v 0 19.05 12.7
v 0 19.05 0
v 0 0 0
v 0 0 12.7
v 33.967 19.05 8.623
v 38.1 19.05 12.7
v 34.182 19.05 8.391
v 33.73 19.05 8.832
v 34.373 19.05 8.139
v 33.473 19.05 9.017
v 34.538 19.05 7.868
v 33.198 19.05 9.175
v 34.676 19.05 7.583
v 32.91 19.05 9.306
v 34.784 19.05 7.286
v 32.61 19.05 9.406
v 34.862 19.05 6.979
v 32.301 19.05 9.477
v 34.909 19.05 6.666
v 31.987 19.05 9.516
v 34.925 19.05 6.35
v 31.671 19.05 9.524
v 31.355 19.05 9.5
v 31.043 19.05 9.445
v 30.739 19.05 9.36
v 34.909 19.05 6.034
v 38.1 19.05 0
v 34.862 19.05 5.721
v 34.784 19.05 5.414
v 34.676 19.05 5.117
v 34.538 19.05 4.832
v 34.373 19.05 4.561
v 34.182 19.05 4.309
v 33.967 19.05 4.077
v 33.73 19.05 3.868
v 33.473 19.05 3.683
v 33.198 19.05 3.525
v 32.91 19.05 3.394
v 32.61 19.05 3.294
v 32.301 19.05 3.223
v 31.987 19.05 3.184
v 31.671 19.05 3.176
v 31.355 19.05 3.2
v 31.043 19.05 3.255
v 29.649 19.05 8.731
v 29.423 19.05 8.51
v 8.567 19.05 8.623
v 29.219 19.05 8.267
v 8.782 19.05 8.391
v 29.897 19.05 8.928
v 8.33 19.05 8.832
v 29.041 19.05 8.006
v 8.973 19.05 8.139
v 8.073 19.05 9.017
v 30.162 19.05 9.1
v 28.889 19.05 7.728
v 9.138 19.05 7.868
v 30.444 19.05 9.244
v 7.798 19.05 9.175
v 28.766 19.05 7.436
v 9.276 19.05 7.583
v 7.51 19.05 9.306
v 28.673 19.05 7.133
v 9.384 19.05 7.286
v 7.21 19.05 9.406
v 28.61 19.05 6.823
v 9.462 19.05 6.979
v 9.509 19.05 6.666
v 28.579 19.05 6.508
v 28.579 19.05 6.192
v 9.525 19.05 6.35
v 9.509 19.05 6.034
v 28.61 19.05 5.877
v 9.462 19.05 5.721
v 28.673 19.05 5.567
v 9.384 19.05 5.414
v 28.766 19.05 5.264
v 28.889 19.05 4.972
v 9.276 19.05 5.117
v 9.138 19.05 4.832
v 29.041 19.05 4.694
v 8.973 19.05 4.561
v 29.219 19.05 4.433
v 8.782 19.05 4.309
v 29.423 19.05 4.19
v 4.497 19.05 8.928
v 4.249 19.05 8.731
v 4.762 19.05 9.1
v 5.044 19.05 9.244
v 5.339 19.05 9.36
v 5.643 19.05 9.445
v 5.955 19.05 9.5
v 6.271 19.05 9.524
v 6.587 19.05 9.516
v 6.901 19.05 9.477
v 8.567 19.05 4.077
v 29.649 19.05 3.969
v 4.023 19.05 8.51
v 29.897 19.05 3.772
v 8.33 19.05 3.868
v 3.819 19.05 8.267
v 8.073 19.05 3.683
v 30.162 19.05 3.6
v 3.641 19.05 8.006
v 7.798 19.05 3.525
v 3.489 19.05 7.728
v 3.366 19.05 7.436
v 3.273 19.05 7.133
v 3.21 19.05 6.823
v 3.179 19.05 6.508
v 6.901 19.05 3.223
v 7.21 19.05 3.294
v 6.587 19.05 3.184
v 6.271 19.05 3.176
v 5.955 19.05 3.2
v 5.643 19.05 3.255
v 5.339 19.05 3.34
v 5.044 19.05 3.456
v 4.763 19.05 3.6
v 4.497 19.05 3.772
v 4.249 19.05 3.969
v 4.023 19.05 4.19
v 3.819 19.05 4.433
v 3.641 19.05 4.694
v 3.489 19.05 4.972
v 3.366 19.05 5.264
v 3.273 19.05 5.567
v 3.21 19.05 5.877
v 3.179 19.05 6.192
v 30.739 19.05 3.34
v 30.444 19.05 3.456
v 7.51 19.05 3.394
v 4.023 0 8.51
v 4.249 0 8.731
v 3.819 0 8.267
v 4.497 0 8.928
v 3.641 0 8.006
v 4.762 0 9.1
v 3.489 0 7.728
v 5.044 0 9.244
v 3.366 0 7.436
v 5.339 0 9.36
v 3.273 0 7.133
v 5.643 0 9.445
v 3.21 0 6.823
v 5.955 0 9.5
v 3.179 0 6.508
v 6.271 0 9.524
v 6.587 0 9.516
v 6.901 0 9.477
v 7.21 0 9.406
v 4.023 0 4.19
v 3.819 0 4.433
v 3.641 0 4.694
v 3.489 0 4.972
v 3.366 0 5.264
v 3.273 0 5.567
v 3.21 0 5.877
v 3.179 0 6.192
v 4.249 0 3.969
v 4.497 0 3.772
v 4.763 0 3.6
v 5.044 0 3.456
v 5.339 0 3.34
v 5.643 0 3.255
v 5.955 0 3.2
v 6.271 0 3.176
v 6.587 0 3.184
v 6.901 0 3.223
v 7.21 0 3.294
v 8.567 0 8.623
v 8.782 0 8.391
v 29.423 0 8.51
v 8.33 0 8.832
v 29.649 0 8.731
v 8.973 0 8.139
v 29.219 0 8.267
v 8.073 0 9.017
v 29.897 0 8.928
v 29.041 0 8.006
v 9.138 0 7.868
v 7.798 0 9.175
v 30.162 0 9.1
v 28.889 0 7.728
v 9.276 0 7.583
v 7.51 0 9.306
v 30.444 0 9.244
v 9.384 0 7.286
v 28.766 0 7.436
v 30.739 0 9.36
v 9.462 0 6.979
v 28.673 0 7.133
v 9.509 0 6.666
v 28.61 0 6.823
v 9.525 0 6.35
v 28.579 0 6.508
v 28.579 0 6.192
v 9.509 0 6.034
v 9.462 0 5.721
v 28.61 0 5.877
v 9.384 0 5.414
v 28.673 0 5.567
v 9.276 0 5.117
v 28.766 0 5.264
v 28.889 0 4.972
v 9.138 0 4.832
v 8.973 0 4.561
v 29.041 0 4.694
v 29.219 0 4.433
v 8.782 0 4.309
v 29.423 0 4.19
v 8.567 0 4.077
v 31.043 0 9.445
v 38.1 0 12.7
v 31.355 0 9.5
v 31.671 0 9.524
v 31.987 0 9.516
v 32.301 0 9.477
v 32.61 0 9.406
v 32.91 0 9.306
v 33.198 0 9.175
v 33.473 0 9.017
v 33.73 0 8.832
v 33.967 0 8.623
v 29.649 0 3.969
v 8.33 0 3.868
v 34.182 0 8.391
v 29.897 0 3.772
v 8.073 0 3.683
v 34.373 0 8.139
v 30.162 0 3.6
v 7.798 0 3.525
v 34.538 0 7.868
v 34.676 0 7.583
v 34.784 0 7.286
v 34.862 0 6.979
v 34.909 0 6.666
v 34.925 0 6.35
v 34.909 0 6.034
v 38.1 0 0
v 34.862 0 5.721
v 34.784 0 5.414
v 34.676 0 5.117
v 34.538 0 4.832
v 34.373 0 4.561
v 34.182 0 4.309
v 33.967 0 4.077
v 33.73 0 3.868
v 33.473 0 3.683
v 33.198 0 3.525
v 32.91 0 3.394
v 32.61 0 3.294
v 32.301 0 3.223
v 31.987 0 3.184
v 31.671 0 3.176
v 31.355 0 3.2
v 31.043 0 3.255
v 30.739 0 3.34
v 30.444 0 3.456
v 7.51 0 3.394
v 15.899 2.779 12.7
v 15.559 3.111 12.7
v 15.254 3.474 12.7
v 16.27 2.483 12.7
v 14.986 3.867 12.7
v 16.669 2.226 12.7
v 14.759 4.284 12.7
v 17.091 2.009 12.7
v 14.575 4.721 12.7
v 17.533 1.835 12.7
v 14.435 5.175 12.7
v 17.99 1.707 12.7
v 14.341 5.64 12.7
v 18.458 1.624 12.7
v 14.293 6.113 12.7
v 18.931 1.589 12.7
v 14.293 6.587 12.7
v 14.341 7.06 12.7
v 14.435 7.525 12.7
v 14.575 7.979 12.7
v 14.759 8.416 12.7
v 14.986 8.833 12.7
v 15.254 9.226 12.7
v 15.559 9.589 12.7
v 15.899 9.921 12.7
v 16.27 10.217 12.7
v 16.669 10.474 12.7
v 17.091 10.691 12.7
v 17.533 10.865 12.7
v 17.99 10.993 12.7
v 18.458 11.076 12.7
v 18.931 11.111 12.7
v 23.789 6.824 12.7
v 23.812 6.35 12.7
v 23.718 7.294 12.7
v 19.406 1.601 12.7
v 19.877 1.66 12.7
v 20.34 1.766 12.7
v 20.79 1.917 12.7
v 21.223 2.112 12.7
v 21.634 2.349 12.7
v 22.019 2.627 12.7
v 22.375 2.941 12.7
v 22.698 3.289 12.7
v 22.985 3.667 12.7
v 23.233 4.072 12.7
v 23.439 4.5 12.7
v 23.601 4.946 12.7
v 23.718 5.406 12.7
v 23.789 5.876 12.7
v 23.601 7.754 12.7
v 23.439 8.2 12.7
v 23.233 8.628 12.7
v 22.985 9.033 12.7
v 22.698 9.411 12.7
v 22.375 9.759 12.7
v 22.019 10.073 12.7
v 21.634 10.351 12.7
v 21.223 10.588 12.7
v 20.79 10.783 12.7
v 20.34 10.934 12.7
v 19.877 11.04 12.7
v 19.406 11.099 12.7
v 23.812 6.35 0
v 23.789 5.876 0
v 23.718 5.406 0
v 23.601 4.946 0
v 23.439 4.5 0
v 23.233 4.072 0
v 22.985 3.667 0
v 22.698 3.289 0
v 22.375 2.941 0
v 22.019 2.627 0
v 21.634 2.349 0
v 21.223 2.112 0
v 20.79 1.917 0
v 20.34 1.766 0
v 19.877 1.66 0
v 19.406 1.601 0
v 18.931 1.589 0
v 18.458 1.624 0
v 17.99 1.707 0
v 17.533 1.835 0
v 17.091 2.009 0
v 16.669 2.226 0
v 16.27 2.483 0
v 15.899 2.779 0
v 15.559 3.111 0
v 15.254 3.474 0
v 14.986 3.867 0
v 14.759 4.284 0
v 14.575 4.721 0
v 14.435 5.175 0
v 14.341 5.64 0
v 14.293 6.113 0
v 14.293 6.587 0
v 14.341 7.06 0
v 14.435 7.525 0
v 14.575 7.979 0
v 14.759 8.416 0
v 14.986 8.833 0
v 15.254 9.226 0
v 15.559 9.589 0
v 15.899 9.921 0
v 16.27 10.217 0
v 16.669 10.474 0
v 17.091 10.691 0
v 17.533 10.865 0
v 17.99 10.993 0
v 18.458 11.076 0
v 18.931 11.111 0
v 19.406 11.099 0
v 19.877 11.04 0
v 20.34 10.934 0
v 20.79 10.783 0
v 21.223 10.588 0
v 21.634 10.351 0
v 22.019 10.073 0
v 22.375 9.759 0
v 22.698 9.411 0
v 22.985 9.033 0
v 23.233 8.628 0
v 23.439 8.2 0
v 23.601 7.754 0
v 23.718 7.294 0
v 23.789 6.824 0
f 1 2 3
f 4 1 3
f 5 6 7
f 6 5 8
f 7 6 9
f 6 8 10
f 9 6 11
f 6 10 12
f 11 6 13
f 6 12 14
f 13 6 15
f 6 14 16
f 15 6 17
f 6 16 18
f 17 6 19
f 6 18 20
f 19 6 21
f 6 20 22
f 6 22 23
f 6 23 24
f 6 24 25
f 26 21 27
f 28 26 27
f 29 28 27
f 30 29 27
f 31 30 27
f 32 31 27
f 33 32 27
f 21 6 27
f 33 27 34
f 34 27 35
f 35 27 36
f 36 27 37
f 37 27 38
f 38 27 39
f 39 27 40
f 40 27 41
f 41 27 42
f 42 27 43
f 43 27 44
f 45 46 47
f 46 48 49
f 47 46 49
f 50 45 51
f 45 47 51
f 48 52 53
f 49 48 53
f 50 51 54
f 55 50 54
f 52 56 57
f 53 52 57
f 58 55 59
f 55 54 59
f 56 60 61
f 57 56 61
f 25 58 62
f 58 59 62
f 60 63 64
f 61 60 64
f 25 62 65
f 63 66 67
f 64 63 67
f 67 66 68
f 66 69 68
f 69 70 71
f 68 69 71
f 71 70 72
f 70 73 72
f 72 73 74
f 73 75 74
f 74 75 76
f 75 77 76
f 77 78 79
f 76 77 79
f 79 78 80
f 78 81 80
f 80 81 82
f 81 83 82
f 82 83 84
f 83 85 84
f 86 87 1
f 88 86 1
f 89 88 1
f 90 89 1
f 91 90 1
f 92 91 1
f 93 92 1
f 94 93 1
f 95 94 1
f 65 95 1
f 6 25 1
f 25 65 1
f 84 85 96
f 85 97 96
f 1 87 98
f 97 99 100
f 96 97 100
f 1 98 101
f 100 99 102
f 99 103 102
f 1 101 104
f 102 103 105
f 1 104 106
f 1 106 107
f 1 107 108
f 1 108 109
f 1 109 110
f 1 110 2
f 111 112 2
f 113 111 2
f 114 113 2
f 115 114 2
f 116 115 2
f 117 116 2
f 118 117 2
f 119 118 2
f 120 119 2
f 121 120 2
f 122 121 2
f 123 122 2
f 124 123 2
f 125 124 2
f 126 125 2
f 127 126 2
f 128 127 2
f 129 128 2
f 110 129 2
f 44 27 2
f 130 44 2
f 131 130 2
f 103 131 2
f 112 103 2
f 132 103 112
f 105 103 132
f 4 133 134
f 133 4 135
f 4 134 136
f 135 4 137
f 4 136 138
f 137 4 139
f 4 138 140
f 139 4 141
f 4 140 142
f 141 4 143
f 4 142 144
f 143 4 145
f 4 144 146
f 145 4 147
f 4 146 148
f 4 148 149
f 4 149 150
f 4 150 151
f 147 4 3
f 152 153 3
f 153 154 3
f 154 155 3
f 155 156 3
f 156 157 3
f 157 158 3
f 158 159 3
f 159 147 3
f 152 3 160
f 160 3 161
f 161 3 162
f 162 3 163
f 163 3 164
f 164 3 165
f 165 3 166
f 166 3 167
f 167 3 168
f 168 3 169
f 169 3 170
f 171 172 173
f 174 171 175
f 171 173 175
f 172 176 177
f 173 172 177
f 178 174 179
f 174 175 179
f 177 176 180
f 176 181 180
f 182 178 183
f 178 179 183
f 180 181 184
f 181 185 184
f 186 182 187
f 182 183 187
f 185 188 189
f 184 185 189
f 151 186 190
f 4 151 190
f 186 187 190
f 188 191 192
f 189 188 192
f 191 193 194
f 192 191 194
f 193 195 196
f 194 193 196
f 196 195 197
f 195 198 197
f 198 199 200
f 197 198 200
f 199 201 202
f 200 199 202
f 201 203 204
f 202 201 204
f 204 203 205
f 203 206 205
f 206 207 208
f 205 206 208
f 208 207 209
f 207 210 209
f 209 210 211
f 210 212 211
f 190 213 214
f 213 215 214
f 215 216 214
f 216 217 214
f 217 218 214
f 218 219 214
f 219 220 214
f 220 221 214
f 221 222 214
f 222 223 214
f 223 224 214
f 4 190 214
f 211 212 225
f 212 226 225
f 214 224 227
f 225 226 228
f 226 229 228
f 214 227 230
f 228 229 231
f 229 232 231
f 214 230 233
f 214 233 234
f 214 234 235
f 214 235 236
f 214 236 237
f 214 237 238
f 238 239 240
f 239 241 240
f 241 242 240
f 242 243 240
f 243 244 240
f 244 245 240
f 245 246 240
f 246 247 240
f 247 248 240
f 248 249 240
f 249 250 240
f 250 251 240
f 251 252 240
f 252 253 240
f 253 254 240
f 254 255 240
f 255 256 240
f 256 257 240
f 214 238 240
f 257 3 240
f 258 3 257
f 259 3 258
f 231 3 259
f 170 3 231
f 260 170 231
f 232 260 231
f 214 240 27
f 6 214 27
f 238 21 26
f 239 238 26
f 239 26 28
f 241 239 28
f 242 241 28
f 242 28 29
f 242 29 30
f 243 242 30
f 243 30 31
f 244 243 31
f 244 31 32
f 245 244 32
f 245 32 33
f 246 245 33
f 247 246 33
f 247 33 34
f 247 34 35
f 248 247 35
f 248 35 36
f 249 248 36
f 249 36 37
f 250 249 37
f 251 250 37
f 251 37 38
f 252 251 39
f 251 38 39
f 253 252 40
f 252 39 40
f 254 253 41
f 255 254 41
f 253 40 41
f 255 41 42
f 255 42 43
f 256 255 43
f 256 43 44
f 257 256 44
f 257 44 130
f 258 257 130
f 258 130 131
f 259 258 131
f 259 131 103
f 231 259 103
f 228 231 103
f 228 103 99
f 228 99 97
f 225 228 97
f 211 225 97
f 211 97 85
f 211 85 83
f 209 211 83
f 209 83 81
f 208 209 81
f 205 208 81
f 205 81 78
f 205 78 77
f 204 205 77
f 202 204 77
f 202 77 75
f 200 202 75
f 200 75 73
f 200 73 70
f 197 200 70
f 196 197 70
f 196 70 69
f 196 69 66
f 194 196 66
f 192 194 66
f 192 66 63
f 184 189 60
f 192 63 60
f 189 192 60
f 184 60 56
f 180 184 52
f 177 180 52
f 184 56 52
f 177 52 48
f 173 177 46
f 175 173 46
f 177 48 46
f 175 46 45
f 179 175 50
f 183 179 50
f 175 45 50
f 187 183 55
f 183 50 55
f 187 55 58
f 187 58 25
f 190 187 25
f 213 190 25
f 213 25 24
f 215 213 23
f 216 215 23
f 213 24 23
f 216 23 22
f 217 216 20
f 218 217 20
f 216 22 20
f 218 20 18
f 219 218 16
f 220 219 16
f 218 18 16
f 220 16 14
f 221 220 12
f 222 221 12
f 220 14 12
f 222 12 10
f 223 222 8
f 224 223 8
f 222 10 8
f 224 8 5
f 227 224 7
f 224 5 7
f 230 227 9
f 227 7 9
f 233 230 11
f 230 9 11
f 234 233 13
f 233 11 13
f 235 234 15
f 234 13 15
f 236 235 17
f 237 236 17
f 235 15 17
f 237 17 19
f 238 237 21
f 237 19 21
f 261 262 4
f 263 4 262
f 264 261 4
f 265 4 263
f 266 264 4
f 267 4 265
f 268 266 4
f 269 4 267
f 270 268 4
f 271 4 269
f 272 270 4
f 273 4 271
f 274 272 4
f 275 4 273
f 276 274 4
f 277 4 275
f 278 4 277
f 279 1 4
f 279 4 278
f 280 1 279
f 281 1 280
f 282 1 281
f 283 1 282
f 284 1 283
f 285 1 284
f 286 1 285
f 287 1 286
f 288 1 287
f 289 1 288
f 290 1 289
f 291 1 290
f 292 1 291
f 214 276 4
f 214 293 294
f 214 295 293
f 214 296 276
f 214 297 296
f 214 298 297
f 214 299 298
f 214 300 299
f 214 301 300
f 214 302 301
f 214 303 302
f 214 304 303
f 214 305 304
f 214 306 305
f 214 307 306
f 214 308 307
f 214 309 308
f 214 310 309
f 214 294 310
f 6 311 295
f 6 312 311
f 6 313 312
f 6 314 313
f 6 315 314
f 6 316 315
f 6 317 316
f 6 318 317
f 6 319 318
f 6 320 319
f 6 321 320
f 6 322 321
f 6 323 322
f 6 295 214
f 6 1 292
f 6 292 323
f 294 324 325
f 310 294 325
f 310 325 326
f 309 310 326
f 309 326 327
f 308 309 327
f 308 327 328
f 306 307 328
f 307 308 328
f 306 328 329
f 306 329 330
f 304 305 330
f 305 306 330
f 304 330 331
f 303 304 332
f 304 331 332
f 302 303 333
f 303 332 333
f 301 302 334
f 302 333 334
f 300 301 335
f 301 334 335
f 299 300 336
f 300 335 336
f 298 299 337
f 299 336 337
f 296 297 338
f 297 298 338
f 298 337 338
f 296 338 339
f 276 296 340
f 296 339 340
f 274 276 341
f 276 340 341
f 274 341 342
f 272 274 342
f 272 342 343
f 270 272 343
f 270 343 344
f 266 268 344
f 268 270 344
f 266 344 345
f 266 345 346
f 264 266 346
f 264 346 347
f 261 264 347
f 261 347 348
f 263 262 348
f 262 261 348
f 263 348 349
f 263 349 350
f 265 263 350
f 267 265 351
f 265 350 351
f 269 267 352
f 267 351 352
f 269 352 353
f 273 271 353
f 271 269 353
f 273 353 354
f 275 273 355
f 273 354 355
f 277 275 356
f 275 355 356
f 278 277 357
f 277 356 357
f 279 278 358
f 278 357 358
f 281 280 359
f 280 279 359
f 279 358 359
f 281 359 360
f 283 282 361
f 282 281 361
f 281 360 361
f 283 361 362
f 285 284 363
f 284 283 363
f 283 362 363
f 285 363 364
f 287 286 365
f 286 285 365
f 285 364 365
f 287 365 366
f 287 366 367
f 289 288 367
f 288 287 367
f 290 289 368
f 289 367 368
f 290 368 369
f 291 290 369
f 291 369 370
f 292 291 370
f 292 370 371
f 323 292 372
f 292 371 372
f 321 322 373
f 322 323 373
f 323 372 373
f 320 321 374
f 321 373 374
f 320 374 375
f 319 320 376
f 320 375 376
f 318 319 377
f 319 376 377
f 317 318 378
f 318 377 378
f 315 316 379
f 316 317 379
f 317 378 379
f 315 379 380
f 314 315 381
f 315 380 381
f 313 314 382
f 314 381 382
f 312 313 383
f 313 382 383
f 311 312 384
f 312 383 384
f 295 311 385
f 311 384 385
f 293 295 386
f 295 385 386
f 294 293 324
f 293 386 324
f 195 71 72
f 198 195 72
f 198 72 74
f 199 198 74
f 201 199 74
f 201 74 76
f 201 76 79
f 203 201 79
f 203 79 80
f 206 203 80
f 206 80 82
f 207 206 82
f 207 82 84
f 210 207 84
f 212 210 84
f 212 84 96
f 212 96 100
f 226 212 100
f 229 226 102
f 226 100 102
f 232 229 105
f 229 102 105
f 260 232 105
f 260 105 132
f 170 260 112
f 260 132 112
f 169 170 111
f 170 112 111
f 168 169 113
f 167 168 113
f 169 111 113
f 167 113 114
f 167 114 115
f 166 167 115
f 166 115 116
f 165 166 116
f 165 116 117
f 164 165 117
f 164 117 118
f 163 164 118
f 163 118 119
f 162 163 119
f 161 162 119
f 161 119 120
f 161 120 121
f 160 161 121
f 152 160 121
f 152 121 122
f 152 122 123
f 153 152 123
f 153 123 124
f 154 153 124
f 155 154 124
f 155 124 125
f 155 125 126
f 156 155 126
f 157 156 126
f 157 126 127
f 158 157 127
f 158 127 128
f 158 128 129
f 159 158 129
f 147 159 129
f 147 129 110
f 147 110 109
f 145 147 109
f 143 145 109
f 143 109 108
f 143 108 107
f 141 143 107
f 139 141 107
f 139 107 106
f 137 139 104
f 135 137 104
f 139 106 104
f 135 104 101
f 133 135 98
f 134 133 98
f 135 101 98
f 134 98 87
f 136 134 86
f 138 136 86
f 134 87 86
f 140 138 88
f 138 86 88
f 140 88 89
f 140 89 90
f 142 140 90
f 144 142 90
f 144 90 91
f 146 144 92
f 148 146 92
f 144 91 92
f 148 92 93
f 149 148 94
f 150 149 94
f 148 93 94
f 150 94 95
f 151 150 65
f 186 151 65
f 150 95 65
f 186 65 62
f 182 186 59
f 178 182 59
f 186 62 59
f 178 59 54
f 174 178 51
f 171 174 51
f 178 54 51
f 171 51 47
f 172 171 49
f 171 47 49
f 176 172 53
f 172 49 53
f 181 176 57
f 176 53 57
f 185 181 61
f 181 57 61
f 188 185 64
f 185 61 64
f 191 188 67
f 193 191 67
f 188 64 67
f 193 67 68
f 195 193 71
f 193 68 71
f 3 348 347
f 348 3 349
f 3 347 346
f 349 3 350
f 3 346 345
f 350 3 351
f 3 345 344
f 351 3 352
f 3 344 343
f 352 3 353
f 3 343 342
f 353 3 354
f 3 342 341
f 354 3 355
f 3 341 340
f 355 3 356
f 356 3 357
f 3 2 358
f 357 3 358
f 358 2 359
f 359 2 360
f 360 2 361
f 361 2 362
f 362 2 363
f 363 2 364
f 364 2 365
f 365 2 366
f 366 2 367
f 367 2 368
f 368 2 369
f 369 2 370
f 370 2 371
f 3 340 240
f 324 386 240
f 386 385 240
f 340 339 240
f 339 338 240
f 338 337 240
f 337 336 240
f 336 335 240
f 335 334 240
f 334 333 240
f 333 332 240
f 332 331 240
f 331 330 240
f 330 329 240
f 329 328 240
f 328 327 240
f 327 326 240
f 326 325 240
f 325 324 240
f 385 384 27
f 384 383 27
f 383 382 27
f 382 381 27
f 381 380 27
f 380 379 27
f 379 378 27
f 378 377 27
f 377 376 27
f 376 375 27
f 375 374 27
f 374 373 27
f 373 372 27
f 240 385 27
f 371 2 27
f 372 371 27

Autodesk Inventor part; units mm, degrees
ref_plane "YZ Plane" through (0, 0, 0) normal (1, 0, 0) x (0, 1, 0)
ref_plane "XZ Plane" through (0, 0, 0) normal (0, 1, 0) x (-1, 0, 0)
ref_plane "XY Plane" through (0, 0, 0) normal (0, 0, 1) x (1, 0, 0)
sketch "Sketch1" plane through (0, 0, 0) normal (0, 0, 1) x (1, 0, 0)
  line L0 (0, 0) -> (38.1, 0)
  line L1 (38.1, 0) -> (38.1, 19.05)
  line L2 (38.1, 19.05) -> (0, 19.05)
  line L3 (0, 19.05) -> (0, 0)
  circle A0 centre (19.05, 6.35) radius 4.7625
  point P0 (0, 9.525)
  point P1 (19.05, 19.05)
  dimension "d0" = 19.05
  dimension "d1" = 38.1
  dimension "d2" = 9.525
  dimension "d5" = 6.35
extrude "Extrusion1" add sketch "Sketch1" along normal blind 12.7
sketch "Sketch2" plane through (0, 19.05, 0) normal (0, 1, 0) x (1, 0, 0)
  line L0 (38.1, 0) -> (38.1, -12.7) projected
  line L1 (0, 0) -> (0, -12.7) projected
  circle A0 centre (6.35, -6.35) radius 3.175
  circle A1 centre (31.75, -6.35) radius 3.175
  point P0 (0, -6.35)
  dimension "d6" = 6.35
  dimension "d7" = 6.35
  dimension "d8" = 6.35
  dimension "d9" = 6.35
extrude "Extrusion2" cut sketch "Sketch2" against normal through all
equation "\"d7\" = d6"
properties part number "8 ball arch mount"
